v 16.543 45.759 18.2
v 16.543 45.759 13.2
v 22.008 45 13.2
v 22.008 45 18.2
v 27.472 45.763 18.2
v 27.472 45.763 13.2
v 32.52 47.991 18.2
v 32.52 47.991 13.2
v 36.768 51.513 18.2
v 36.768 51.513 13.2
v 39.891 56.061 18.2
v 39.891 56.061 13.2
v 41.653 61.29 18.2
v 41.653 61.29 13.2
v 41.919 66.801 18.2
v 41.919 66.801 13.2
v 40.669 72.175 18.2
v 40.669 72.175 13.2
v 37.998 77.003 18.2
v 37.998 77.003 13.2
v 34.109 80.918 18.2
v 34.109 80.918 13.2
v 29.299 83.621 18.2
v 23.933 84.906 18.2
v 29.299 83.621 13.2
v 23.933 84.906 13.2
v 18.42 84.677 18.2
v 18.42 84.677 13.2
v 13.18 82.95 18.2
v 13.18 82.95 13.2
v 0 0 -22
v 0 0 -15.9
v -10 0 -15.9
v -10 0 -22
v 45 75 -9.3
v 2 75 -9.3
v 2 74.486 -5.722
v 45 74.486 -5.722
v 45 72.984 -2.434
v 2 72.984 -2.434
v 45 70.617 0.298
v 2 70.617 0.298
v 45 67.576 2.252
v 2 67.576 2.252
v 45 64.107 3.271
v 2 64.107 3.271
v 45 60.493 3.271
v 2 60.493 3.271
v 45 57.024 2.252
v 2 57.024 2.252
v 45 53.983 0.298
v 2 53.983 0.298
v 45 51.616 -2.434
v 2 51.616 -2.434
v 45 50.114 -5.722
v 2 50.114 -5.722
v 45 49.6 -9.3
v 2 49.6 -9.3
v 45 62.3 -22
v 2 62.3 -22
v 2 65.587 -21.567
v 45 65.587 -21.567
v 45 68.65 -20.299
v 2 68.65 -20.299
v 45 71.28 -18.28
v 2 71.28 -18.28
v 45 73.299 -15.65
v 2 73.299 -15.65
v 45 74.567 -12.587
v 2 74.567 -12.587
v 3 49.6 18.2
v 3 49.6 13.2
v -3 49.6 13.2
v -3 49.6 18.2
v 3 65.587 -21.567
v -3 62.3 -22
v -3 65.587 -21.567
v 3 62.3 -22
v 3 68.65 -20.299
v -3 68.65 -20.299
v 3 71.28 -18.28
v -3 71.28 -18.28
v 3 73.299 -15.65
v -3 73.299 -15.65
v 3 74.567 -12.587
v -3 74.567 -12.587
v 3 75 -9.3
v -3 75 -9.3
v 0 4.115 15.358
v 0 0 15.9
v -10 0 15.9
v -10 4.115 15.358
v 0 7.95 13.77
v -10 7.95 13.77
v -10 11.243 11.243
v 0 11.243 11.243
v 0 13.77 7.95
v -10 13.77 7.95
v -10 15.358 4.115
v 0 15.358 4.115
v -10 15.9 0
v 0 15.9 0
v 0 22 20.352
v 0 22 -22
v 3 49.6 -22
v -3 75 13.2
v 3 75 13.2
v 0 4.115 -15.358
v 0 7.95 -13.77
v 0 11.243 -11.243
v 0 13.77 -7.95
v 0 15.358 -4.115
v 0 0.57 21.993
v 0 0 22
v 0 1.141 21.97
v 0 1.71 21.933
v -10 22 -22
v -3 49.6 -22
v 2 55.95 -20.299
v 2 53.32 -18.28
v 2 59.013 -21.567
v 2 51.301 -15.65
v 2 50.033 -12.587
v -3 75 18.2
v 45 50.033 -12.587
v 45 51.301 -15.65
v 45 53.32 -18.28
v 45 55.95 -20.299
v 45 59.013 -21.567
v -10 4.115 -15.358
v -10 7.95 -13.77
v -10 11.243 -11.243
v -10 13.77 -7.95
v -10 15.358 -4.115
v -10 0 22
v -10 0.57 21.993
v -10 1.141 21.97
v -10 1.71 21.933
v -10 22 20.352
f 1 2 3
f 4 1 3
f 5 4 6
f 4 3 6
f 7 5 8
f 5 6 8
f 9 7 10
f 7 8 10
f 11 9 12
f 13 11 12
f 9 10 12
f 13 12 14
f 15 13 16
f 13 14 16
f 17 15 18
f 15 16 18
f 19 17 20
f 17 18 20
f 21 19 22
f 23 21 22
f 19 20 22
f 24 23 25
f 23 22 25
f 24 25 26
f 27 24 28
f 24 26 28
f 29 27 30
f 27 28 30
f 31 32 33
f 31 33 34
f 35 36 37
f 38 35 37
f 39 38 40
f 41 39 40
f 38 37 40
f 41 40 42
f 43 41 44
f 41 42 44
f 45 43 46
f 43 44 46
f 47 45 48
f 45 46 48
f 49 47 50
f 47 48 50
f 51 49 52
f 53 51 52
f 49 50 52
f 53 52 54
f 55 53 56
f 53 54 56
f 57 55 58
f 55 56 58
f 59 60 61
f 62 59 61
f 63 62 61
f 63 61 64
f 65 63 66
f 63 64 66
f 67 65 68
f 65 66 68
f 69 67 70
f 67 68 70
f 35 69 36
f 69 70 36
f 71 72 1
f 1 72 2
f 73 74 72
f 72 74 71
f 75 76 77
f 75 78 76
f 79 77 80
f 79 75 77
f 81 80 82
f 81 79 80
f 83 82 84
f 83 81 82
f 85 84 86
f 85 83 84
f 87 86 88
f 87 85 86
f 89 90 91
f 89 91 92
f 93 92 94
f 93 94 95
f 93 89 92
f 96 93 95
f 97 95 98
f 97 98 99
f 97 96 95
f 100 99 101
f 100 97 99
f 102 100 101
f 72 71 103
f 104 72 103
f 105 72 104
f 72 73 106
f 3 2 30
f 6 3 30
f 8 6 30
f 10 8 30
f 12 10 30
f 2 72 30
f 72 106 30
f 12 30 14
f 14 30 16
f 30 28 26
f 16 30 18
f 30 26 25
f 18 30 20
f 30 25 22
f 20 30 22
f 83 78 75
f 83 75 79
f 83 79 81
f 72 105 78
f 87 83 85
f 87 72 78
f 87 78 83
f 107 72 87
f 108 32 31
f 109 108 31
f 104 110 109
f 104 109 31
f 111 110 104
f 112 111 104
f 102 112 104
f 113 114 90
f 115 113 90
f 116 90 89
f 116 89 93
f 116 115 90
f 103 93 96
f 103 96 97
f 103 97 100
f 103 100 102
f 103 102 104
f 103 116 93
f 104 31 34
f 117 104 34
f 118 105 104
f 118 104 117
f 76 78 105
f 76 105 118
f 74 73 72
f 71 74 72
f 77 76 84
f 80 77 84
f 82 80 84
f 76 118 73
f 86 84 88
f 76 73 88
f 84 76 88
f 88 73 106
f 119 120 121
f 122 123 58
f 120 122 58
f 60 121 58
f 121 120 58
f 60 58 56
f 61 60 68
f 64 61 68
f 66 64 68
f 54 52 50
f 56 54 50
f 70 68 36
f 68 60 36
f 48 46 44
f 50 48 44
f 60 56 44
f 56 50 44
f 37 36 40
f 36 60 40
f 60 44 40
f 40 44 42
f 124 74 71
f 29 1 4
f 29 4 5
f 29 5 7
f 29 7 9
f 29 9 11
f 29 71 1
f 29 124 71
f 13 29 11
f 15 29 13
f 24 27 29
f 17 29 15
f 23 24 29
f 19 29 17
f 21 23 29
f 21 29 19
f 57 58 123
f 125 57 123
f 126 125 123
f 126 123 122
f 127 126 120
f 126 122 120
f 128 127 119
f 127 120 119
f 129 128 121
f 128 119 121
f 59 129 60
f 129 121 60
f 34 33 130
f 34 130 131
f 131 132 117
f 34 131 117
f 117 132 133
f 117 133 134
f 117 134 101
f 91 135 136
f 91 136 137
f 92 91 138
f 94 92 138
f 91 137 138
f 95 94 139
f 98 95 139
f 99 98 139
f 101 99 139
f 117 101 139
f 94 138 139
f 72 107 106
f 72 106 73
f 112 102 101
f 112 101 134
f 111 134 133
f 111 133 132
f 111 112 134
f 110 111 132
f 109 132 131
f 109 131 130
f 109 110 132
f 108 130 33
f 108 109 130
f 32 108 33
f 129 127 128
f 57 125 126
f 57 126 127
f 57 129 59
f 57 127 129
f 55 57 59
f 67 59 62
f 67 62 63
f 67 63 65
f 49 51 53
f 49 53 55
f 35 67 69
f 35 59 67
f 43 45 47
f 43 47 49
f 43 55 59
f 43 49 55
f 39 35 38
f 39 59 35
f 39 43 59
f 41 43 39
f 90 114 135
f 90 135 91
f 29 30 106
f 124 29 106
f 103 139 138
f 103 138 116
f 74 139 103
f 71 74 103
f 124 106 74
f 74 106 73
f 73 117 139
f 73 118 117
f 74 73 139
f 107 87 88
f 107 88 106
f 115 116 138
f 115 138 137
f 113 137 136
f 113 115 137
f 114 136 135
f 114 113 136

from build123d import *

# Parameters (mm, degrees)
F1_DEPTH      = 10
F2_DEPTH      = 3
F2_DEPTH_BACK = 3
F1_FACE_W     = 10
F1_FACE_H     = 42.3516603272
F2_FACE_W     = 6
F2_FACE_H     = 40.2
F5_DEPTH      = 5
F6_START      = 2
F6_DEPTH      = 43
F8_DEPTH      = 5


# Not quite as in the source:
# - a feature names something its author has since deleted; it is built from what else it names


with BuildPart() as f1:
    # F0 (on Right) → F1 (new body)
    with BuildSketch(Plane.YZ):
        with BuildLine():
            ThreePointArc((15.9, 0), (11.2429978209, -11.2429978209), (0, -15.9))
            Line((0, -15.9), (0, -22))
            ThreePointArc((0, -22), (15.5563491861, -15.5563491861), (22, 0))
            ThreePointArc((22, 0), (16.1495801051, 14.9395803966), (1.7099034157, 21.9334500321))
            ThreePointArc((1.7099034157, 21.9334500321), (0.8555989991, 21.9833562122), (0, 22))
            Line((0, 22), (0, 15.9))
            ThreePointArc((0, 15.9), (11.2429978209, 11.2429978209), (15.9, 0))
        make_face()
        with BuildLine():
            ThreePointArc((1.7099034157, 21.9334500321), (16.1495801051, 14.9395803966), (22, 0))
            Line((22, 0), (22, 20.3516603272))
            Line((22, 20.3516603272), (1.7099034157, 21.9334500321))
        make_face()
        with BuildLine():
            ThreePointArc((22, 0), (15.5563491861, -15.5563491861), (0, -22))
            Line((0, -22), (22, -22))
            Line((22, -22), (22, 0))
        make_face()
    extrude(amount=-F1_DEPTH)


with BuildPart() as f2:
    # F0 (on Right) → F2 (new body, two sides)
    with BuildSketch(Plane.YZ) as f2_sk:
        with BuildLine():
            Line((75, 18.2), (49.6, 18.2))
            Line((49.6, 18.2), (49.6, 13.2))
            Line((49.6, 13.2), (49.6, -9.3))
            ThreePointArc((49.6, -9.3), (62.3, 3.4), (75, -9.3))
            Line((75, -9.3), (75, 0))
            Line((75, 0), (75, 18.2))
        make_face()
        with BuildLine():
            ThreePointArc((49.6, -9.3), (53.3197438789, -18.2802561211), (62.3, -22))
            ThreePointArc((62.3, -22), (71.2802561211, -18.2802561211), (75, -9.3))
            ThreePointArc((75, -9.3), (62.3, 3.4), (49.6, -9.3))
        make_face()
        with BuildLine():
            Line((49.6, -9.3), (49.6, -22))
            Line((49.6, -22), (62.3, -22))
            ThreePointArc((62.3, -22), (53.3197438789, -18.2802561211), (49.6, -9.3))
        make_face()
    extrude(amount=F2_DEPTH)
    extrude(f2_sk.sketch, amount=-F2_DEPTH_BACK)


with BuildPart() as f3:
    # F1_face (on face) → F3 section 0
    with BuildSketch(Plane(origin=(-5, 22, -0.8241698364), x_dir=(-1, 0, 0), z_dir=(0, 1, 0))):
        Rectangle(F1_FACE_W, F1_FACE_H)
    # F2_face (on face) → F3 section 1
    with BuildSketch(Plane(origin=(0, 49.6, -1.9), x_dir=(1, 0, 0), z_dir=(0, -1, 0))):
        Rectangle(F2_FACE_W, F2_FACE_H)
    loft()


with BuildPart() as f1_1:
    add(f1.part)

    # F4: union F2, F3
    add(f2.part)
    add(f3.part)

    # F5 (cut): a face of the model
    f5_faces = [f1_1.faces().sort_by_distance(p)[0] for p in [
        (0, 62.3, 18.2),
    ]]
    extrude(f5_faces, amount=-F5_DEPTH, mode=Mode.SUBTRACT)


with BuildPart() as f6:
    # F0 (on Right) → F6 (new body)
    with BuildSketch(Plane.YZ.offset(F6_START)):
        with BuildLine():
            ThreePointArc((49.6, -9.3), (53.3197438789, -18.2802561211), (62.3, -22))
            ThreePointArc((62.3, -22), (71.2802561211, -18.2802561211), (75, -9.3))
            ThreePointArc((75, -9.3), (62.3, 3.4), (49.6, -9.3))
        make_face()
    extrude(amount=F6_DEPTH)


with BuildPart() as f8:
    # F7 (on face) → F8 (new body)
    with BuildSketch(Plane.XY.offset(13.2)):
        with BuildLine():
            ThreePointArc((16.5427559466, 45.7589374685), (34.0593349512, 49.0446735999), (42, 65))
            ThreePointArc((42, 65), (32.5735853544, 81.9764334521), (13.1800707248, 82.9501768119))
            ThreePointArc((13.1800707248, 82.9501768119), (6.9089457299, 78.1247887989), (3, 71.2449979984))
            Line((3, 71.2449979984), (3, 58.7550020016))
            ThreePointArc((3, 58.7550020016), (8.1521257946, 50.5696022234), (16.5427559466, 45.7589374685))
        make_face()
        with BuildLine():
            Line((3, 49.6), (16.5427559466, 45.7589374685))
            ThreePointArc((16.5427559466, 45.7589374685), (8.1521257946, 50.5696022234), (3, 58.7550020016))
            Line((3, 58.7550020016), (3, 49.6))
        make_face()
        with BuildLine():
            ThreePointArc((3, 58.7550020016), (2, 65), (3, 71.2449979984))
            Line((3, 71.2449979984), (3, 75))
            Line((3, 75), (-3, 75))
            Line((-3, 75), (-3, 49.6))
            Line((-3, 49.6), (3, 49.6))
            Line((3, 49.6), (3, 58.7550020016))
        make_face()
        with BuildLine():
            ThreePointArc((3, 71.2449979984), (6.9089457299, 78.1247887989), (13.1800707248, 82.9501768119))
            Line((13.1800707248, 82.9501768119), (-3, 75))
            Line((-3, 75), (3, 75))
            Line((3, 75), (3, 71.2449979984))
        make_face()
        with BuildLine():
            Line((3, 58.7550020016), (3, 71.2449979984))
            ThreePointArc((3, 71.2449979984), (2, 65), (3, 58.7550020016))
        make_face()
    extrude(amount=F8_DEPTH)


solid = Compound([f1_1.part, f6.part, f8.part])
